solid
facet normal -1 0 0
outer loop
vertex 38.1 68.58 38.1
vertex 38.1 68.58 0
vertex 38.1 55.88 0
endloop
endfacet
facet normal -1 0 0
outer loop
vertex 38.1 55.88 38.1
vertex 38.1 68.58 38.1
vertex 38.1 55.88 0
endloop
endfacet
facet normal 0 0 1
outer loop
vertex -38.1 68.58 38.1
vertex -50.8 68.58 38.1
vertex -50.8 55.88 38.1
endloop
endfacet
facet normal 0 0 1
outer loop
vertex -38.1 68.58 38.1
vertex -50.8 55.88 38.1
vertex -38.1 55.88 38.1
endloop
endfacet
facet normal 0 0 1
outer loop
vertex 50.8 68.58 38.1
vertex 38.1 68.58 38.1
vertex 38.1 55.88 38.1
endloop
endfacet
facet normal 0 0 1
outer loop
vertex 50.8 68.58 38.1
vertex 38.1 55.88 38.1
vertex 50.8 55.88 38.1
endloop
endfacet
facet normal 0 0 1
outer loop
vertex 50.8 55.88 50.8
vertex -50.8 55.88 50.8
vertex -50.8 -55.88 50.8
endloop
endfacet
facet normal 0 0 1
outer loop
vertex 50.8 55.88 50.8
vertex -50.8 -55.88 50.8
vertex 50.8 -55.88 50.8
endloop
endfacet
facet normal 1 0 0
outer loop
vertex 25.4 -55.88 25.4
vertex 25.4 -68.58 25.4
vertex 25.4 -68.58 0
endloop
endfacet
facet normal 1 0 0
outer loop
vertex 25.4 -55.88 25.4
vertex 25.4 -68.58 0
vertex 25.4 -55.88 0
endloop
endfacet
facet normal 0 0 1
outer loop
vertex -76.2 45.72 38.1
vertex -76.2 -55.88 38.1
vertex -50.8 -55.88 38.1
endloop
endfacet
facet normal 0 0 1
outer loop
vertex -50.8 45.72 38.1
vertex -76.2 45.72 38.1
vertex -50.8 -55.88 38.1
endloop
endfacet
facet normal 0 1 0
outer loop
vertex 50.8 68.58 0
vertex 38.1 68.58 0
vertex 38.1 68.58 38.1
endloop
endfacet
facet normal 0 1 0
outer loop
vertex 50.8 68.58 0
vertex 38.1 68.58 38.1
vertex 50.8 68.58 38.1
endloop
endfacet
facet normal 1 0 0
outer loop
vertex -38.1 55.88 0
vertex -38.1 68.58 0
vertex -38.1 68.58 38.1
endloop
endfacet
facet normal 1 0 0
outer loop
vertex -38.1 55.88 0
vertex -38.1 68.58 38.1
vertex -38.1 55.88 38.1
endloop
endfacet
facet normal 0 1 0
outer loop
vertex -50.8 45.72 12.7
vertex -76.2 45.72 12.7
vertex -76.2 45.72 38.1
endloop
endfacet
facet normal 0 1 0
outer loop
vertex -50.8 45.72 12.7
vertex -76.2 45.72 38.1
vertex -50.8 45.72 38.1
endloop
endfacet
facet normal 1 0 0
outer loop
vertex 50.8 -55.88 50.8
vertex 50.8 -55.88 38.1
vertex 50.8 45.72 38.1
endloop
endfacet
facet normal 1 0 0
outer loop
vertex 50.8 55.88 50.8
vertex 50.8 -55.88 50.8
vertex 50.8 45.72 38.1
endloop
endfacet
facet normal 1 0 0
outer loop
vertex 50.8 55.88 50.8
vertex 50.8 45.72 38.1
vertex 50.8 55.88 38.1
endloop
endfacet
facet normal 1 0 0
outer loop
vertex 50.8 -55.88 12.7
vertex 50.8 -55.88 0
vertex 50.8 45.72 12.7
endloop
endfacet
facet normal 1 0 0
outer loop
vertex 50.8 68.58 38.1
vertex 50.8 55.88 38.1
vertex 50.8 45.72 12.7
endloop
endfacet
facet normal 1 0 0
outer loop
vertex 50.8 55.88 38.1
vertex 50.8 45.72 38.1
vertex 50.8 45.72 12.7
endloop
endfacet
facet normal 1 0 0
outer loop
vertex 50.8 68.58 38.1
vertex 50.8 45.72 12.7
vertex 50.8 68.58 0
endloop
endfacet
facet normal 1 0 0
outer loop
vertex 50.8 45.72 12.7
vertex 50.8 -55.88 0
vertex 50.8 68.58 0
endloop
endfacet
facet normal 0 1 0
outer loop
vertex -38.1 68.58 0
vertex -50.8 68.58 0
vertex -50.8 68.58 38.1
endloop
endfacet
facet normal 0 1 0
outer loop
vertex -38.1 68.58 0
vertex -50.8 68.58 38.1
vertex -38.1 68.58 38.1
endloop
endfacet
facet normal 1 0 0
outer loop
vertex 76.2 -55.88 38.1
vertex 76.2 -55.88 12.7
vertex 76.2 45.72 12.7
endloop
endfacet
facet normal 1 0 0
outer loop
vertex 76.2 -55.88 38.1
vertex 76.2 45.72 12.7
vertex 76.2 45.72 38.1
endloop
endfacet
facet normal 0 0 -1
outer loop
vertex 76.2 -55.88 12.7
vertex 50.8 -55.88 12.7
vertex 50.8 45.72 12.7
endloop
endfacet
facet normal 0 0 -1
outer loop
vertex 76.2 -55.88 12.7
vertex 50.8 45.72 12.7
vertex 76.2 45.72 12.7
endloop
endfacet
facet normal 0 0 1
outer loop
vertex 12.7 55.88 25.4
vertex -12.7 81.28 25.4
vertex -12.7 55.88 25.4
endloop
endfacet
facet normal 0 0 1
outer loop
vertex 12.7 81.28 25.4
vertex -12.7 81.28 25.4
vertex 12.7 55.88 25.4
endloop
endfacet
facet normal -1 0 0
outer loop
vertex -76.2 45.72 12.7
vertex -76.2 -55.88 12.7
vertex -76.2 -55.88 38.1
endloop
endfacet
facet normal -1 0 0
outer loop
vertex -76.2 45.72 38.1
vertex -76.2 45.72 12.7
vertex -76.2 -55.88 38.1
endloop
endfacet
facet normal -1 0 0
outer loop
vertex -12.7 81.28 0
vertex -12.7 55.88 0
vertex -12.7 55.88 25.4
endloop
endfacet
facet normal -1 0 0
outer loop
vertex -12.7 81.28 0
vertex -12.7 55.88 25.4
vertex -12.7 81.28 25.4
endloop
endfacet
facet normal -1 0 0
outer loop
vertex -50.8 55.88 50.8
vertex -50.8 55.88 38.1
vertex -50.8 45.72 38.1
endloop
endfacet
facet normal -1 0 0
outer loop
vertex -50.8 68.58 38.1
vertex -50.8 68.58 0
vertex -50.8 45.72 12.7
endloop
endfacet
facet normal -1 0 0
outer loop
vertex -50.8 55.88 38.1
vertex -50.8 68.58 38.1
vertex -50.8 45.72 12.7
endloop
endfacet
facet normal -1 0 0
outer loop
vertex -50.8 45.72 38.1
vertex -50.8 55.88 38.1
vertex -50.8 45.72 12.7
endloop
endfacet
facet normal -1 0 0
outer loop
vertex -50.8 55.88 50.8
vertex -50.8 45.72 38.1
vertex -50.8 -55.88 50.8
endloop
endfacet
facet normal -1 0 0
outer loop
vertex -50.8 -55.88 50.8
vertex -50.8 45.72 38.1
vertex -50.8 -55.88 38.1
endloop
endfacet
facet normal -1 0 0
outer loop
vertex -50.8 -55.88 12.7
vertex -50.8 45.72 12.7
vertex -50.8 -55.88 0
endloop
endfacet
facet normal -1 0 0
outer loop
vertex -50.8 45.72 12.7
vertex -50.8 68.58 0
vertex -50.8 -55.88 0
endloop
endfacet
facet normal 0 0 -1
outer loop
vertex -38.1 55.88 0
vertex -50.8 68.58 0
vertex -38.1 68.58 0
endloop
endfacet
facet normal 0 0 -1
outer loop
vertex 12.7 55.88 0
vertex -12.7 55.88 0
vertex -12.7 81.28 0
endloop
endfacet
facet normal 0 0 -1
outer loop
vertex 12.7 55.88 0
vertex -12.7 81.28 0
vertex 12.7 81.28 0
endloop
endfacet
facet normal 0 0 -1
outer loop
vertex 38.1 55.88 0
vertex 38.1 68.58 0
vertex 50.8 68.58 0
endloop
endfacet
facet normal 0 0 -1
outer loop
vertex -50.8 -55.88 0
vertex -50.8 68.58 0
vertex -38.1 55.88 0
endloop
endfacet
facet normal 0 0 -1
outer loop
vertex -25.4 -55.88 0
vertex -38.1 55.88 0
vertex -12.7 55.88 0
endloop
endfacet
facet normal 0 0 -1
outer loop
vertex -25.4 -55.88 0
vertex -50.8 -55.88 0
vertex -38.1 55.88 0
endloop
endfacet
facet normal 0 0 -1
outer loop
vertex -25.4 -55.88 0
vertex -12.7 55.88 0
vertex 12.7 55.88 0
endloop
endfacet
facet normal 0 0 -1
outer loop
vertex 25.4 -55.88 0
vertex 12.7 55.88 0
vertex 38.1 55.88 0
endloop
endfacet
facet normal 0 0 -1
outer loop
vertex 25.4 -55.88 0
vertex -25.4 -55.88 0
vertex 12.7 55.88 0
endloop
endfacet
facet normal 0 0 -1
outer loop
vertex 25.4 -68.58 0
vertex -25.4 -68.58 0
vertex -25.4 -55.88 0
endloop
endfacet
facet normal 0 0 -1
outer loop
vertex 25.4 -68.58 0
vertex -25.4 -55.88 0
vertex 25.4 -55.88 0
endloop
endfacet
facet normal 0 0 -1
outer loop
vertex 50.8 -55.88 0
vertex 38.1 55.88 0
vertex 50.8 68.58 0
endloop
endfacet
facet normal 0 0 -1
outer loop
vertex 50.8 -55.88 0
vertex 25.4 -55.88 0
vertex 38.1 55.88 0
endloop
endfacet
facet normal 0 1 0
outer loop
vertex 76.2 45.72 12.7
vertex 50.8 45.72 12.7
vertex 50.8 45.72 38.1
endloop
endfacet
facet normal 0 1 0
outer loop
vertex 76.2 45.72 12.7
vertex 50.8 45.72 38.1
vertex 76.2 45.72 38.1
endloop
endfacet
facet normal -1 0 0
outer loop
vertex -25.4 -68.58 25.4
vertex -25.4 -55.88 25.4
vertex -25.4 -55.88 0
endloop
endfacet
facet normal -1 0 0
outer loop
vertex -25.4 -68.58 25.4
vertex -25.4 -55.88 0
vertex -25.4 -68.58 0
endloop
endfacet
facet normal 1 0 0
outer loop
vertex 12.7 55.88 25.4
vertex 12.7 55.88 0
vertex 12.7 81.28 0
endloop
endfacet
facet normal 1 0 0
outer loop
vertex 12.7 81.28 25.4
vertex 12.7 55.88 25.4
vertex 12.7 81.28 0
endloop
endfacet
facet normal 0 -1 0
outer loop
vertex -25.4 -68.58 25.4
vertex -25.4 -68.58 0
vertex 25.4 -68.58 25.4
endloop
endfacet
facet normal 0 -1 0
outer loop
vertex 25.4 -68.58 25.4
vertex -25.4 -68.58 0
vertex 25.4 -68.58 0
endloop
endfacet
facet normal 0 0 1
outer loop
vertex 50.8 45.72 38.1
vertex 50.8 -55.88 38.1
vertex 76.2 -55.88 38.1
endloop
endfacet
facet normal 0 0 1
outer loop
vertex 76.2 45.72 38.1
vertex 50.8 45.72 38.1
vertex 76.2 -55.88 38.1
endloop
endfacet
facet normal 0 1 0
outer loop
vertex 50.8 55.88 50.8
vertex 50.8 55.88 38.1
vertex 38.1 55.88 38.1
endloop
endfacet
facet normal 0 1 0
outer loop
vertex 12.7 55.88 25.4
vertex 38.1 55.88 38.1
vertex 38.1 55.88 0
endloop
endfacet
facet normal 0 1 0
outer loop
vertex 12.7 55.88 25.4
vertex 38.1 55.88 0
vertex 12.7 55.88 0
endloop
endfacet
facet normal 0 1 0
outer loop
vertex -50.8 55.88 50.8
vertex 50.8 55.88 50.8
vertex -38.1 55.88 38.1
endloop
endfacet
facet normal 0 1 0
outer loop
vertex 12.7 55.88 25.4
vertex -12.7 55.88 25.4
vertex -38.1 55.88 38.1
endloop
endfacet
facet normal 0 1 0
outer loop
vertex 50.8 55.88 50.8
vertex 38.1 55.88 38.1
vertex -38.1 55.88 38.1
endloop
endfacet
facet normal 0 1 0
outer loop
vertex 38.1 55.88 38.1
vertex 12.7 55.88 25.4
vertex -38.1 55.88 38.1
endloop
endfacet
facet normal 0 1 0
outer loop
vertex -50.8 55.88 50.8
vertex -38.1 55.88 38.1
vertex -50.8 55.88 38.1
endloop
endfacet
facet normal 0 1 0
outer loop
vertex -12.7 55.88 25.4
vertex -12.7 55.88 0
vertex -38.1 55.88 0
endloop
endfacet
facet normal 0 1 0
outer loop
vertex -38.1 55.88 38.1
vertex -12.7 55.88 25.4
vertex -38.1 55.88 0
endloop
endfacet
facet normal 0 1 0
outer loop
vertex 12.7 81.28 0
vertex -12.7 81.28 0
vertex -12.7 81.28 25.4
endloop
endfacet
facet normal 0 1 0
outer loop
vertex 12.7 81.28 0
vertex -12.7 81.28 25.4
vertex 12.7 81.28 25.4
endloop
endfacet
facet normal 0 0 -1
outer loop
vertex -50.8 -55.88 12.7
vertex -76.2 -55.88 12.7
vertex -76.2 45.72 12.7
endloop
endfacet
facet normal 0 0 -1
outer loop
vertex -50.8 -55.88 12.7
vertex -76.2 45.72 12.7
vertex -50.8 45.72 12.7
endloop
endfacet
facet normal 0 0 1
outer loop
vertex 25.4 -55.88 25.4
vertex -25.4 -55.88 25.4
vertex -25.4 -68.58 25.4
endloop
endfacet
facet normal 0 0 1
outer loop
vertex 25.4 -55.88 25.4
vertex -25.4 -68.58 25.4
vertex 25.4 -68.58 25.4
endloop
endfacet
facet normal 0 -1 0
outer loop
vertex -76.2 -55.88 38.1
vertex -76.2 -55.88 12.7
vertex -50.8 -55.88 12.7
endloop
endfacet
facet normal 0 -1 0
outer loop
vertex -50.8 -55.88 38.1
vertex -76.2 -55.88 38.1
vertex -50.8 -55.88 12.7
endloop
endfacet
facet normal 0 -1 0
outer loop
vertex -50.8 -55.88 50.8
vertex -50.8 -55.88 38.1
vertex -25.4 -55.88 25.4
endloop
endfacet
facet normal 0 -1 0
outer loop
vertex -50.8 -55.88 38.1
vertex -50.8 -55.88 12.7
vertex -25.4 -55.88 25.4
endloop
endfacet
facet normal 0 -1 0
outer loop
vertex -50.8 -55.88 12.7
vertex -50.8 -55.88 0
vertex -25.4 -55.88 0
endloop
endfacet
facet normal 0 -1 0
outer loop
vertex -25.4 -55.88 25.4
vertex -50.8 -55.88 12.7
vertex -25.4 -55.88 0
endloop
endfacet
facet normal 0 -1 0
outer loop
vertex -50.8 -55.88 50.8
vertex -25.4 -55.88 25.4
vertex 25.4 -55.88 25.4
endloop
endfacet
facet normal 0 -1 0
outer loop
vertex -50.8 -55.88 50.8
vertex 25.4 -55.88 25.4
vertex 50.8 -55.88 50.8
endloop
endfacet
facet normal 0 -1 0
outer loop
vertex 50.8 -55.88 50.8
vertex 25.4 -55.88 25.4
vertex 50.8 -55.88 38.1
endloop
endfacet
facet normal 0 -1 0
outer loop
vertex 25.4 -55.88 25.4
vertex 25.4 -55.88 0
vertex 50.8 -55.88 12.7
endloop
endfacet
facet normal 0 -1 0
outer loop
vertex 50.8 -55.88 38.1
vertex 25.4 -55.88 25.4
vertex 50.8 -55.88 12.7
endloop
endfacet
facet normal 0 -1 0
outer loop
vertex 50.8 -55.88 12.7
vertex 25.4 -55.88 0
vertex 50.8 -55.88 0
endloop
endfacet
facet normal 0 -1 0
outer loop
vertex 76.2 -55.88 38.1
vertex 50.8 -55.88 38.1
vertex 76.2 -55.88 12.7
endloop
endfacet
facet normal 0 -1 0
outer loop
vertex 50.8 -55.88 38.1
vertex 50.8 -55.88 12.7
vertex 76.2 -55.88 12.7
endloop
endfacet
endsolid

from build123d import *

# Parameters (mm, degrees)
F1_DEPTH = 50.8
F2_DEPTH = 25.4
F0_W     = 25.4
F0_H     = 25.4
F3_DEPTH = 25.4
F4_W     = 25.4
F4_H     = 25.4
F5_DEPTH = 101.6
F6_W     = 12.7
F6_H     = 12.7
F7_DEPTH = 38.1


with BuildPart() as f1:
    # F0 (on Top) → F1 (new body)
    with BuildSketch(Plane.XY):
        Polygon((-50.8, 55.880003), (-50.8, -55.880003), (-25.4, -55.880003), (25.4, -55.880003), (50.8, -55.880003), (50.8, 55.880003), (12.7, 55.880003), (-12.7, 55.880003), align=None)
    extrude(amount=F1_DEPTH)

    # F0 (on Top) → F2 (join)
    with BuildSketch(Plane.XY):
        Polygon((25.4, -55.880003), (-25.4, -55.880003), (-25.4, -68.580003), (-12.7, -68.580003), (12.7, -68.580003), (25.4, -68.580003), align=None)
    extrude(amount=F2_DEPTH)

    # F0 (on Top) → F3 (join)
    with BuildSketch(Plane.XY):
        with Locations((0, 68.580003)):
            Rectangle(F0_W, F0_H)
    extrude(amount=F3_DEPTH)

    # F4 (on face) → F5 (join)
    with BuildSketch(Plane.XZ.offset(55.880003)):
        with Locations((-63.5, 25.4)):
            Rectangle(F4_W, F4_H)
        with Locations((63.5, 25.4)):
            Rectangle(F4_W, F4_H)
    extrude(amount=-F5_DEPTH)

    # F6 (on face) → F7 (join)
    with BuildSketch(Plane(origin=(0, 0, 0), x_dir=(1, 0, 0), z_dir=(0, 0, -1))):
        with Locations((-44.45, -62.230003)):
            Rectangle(F6_W, F6_H)
        with Locations((44.45, -62.230003)):
            Rectangle(F6_W, F6_H)
    extrude(amount=-F7_DEPTH)


solid = f1.part
